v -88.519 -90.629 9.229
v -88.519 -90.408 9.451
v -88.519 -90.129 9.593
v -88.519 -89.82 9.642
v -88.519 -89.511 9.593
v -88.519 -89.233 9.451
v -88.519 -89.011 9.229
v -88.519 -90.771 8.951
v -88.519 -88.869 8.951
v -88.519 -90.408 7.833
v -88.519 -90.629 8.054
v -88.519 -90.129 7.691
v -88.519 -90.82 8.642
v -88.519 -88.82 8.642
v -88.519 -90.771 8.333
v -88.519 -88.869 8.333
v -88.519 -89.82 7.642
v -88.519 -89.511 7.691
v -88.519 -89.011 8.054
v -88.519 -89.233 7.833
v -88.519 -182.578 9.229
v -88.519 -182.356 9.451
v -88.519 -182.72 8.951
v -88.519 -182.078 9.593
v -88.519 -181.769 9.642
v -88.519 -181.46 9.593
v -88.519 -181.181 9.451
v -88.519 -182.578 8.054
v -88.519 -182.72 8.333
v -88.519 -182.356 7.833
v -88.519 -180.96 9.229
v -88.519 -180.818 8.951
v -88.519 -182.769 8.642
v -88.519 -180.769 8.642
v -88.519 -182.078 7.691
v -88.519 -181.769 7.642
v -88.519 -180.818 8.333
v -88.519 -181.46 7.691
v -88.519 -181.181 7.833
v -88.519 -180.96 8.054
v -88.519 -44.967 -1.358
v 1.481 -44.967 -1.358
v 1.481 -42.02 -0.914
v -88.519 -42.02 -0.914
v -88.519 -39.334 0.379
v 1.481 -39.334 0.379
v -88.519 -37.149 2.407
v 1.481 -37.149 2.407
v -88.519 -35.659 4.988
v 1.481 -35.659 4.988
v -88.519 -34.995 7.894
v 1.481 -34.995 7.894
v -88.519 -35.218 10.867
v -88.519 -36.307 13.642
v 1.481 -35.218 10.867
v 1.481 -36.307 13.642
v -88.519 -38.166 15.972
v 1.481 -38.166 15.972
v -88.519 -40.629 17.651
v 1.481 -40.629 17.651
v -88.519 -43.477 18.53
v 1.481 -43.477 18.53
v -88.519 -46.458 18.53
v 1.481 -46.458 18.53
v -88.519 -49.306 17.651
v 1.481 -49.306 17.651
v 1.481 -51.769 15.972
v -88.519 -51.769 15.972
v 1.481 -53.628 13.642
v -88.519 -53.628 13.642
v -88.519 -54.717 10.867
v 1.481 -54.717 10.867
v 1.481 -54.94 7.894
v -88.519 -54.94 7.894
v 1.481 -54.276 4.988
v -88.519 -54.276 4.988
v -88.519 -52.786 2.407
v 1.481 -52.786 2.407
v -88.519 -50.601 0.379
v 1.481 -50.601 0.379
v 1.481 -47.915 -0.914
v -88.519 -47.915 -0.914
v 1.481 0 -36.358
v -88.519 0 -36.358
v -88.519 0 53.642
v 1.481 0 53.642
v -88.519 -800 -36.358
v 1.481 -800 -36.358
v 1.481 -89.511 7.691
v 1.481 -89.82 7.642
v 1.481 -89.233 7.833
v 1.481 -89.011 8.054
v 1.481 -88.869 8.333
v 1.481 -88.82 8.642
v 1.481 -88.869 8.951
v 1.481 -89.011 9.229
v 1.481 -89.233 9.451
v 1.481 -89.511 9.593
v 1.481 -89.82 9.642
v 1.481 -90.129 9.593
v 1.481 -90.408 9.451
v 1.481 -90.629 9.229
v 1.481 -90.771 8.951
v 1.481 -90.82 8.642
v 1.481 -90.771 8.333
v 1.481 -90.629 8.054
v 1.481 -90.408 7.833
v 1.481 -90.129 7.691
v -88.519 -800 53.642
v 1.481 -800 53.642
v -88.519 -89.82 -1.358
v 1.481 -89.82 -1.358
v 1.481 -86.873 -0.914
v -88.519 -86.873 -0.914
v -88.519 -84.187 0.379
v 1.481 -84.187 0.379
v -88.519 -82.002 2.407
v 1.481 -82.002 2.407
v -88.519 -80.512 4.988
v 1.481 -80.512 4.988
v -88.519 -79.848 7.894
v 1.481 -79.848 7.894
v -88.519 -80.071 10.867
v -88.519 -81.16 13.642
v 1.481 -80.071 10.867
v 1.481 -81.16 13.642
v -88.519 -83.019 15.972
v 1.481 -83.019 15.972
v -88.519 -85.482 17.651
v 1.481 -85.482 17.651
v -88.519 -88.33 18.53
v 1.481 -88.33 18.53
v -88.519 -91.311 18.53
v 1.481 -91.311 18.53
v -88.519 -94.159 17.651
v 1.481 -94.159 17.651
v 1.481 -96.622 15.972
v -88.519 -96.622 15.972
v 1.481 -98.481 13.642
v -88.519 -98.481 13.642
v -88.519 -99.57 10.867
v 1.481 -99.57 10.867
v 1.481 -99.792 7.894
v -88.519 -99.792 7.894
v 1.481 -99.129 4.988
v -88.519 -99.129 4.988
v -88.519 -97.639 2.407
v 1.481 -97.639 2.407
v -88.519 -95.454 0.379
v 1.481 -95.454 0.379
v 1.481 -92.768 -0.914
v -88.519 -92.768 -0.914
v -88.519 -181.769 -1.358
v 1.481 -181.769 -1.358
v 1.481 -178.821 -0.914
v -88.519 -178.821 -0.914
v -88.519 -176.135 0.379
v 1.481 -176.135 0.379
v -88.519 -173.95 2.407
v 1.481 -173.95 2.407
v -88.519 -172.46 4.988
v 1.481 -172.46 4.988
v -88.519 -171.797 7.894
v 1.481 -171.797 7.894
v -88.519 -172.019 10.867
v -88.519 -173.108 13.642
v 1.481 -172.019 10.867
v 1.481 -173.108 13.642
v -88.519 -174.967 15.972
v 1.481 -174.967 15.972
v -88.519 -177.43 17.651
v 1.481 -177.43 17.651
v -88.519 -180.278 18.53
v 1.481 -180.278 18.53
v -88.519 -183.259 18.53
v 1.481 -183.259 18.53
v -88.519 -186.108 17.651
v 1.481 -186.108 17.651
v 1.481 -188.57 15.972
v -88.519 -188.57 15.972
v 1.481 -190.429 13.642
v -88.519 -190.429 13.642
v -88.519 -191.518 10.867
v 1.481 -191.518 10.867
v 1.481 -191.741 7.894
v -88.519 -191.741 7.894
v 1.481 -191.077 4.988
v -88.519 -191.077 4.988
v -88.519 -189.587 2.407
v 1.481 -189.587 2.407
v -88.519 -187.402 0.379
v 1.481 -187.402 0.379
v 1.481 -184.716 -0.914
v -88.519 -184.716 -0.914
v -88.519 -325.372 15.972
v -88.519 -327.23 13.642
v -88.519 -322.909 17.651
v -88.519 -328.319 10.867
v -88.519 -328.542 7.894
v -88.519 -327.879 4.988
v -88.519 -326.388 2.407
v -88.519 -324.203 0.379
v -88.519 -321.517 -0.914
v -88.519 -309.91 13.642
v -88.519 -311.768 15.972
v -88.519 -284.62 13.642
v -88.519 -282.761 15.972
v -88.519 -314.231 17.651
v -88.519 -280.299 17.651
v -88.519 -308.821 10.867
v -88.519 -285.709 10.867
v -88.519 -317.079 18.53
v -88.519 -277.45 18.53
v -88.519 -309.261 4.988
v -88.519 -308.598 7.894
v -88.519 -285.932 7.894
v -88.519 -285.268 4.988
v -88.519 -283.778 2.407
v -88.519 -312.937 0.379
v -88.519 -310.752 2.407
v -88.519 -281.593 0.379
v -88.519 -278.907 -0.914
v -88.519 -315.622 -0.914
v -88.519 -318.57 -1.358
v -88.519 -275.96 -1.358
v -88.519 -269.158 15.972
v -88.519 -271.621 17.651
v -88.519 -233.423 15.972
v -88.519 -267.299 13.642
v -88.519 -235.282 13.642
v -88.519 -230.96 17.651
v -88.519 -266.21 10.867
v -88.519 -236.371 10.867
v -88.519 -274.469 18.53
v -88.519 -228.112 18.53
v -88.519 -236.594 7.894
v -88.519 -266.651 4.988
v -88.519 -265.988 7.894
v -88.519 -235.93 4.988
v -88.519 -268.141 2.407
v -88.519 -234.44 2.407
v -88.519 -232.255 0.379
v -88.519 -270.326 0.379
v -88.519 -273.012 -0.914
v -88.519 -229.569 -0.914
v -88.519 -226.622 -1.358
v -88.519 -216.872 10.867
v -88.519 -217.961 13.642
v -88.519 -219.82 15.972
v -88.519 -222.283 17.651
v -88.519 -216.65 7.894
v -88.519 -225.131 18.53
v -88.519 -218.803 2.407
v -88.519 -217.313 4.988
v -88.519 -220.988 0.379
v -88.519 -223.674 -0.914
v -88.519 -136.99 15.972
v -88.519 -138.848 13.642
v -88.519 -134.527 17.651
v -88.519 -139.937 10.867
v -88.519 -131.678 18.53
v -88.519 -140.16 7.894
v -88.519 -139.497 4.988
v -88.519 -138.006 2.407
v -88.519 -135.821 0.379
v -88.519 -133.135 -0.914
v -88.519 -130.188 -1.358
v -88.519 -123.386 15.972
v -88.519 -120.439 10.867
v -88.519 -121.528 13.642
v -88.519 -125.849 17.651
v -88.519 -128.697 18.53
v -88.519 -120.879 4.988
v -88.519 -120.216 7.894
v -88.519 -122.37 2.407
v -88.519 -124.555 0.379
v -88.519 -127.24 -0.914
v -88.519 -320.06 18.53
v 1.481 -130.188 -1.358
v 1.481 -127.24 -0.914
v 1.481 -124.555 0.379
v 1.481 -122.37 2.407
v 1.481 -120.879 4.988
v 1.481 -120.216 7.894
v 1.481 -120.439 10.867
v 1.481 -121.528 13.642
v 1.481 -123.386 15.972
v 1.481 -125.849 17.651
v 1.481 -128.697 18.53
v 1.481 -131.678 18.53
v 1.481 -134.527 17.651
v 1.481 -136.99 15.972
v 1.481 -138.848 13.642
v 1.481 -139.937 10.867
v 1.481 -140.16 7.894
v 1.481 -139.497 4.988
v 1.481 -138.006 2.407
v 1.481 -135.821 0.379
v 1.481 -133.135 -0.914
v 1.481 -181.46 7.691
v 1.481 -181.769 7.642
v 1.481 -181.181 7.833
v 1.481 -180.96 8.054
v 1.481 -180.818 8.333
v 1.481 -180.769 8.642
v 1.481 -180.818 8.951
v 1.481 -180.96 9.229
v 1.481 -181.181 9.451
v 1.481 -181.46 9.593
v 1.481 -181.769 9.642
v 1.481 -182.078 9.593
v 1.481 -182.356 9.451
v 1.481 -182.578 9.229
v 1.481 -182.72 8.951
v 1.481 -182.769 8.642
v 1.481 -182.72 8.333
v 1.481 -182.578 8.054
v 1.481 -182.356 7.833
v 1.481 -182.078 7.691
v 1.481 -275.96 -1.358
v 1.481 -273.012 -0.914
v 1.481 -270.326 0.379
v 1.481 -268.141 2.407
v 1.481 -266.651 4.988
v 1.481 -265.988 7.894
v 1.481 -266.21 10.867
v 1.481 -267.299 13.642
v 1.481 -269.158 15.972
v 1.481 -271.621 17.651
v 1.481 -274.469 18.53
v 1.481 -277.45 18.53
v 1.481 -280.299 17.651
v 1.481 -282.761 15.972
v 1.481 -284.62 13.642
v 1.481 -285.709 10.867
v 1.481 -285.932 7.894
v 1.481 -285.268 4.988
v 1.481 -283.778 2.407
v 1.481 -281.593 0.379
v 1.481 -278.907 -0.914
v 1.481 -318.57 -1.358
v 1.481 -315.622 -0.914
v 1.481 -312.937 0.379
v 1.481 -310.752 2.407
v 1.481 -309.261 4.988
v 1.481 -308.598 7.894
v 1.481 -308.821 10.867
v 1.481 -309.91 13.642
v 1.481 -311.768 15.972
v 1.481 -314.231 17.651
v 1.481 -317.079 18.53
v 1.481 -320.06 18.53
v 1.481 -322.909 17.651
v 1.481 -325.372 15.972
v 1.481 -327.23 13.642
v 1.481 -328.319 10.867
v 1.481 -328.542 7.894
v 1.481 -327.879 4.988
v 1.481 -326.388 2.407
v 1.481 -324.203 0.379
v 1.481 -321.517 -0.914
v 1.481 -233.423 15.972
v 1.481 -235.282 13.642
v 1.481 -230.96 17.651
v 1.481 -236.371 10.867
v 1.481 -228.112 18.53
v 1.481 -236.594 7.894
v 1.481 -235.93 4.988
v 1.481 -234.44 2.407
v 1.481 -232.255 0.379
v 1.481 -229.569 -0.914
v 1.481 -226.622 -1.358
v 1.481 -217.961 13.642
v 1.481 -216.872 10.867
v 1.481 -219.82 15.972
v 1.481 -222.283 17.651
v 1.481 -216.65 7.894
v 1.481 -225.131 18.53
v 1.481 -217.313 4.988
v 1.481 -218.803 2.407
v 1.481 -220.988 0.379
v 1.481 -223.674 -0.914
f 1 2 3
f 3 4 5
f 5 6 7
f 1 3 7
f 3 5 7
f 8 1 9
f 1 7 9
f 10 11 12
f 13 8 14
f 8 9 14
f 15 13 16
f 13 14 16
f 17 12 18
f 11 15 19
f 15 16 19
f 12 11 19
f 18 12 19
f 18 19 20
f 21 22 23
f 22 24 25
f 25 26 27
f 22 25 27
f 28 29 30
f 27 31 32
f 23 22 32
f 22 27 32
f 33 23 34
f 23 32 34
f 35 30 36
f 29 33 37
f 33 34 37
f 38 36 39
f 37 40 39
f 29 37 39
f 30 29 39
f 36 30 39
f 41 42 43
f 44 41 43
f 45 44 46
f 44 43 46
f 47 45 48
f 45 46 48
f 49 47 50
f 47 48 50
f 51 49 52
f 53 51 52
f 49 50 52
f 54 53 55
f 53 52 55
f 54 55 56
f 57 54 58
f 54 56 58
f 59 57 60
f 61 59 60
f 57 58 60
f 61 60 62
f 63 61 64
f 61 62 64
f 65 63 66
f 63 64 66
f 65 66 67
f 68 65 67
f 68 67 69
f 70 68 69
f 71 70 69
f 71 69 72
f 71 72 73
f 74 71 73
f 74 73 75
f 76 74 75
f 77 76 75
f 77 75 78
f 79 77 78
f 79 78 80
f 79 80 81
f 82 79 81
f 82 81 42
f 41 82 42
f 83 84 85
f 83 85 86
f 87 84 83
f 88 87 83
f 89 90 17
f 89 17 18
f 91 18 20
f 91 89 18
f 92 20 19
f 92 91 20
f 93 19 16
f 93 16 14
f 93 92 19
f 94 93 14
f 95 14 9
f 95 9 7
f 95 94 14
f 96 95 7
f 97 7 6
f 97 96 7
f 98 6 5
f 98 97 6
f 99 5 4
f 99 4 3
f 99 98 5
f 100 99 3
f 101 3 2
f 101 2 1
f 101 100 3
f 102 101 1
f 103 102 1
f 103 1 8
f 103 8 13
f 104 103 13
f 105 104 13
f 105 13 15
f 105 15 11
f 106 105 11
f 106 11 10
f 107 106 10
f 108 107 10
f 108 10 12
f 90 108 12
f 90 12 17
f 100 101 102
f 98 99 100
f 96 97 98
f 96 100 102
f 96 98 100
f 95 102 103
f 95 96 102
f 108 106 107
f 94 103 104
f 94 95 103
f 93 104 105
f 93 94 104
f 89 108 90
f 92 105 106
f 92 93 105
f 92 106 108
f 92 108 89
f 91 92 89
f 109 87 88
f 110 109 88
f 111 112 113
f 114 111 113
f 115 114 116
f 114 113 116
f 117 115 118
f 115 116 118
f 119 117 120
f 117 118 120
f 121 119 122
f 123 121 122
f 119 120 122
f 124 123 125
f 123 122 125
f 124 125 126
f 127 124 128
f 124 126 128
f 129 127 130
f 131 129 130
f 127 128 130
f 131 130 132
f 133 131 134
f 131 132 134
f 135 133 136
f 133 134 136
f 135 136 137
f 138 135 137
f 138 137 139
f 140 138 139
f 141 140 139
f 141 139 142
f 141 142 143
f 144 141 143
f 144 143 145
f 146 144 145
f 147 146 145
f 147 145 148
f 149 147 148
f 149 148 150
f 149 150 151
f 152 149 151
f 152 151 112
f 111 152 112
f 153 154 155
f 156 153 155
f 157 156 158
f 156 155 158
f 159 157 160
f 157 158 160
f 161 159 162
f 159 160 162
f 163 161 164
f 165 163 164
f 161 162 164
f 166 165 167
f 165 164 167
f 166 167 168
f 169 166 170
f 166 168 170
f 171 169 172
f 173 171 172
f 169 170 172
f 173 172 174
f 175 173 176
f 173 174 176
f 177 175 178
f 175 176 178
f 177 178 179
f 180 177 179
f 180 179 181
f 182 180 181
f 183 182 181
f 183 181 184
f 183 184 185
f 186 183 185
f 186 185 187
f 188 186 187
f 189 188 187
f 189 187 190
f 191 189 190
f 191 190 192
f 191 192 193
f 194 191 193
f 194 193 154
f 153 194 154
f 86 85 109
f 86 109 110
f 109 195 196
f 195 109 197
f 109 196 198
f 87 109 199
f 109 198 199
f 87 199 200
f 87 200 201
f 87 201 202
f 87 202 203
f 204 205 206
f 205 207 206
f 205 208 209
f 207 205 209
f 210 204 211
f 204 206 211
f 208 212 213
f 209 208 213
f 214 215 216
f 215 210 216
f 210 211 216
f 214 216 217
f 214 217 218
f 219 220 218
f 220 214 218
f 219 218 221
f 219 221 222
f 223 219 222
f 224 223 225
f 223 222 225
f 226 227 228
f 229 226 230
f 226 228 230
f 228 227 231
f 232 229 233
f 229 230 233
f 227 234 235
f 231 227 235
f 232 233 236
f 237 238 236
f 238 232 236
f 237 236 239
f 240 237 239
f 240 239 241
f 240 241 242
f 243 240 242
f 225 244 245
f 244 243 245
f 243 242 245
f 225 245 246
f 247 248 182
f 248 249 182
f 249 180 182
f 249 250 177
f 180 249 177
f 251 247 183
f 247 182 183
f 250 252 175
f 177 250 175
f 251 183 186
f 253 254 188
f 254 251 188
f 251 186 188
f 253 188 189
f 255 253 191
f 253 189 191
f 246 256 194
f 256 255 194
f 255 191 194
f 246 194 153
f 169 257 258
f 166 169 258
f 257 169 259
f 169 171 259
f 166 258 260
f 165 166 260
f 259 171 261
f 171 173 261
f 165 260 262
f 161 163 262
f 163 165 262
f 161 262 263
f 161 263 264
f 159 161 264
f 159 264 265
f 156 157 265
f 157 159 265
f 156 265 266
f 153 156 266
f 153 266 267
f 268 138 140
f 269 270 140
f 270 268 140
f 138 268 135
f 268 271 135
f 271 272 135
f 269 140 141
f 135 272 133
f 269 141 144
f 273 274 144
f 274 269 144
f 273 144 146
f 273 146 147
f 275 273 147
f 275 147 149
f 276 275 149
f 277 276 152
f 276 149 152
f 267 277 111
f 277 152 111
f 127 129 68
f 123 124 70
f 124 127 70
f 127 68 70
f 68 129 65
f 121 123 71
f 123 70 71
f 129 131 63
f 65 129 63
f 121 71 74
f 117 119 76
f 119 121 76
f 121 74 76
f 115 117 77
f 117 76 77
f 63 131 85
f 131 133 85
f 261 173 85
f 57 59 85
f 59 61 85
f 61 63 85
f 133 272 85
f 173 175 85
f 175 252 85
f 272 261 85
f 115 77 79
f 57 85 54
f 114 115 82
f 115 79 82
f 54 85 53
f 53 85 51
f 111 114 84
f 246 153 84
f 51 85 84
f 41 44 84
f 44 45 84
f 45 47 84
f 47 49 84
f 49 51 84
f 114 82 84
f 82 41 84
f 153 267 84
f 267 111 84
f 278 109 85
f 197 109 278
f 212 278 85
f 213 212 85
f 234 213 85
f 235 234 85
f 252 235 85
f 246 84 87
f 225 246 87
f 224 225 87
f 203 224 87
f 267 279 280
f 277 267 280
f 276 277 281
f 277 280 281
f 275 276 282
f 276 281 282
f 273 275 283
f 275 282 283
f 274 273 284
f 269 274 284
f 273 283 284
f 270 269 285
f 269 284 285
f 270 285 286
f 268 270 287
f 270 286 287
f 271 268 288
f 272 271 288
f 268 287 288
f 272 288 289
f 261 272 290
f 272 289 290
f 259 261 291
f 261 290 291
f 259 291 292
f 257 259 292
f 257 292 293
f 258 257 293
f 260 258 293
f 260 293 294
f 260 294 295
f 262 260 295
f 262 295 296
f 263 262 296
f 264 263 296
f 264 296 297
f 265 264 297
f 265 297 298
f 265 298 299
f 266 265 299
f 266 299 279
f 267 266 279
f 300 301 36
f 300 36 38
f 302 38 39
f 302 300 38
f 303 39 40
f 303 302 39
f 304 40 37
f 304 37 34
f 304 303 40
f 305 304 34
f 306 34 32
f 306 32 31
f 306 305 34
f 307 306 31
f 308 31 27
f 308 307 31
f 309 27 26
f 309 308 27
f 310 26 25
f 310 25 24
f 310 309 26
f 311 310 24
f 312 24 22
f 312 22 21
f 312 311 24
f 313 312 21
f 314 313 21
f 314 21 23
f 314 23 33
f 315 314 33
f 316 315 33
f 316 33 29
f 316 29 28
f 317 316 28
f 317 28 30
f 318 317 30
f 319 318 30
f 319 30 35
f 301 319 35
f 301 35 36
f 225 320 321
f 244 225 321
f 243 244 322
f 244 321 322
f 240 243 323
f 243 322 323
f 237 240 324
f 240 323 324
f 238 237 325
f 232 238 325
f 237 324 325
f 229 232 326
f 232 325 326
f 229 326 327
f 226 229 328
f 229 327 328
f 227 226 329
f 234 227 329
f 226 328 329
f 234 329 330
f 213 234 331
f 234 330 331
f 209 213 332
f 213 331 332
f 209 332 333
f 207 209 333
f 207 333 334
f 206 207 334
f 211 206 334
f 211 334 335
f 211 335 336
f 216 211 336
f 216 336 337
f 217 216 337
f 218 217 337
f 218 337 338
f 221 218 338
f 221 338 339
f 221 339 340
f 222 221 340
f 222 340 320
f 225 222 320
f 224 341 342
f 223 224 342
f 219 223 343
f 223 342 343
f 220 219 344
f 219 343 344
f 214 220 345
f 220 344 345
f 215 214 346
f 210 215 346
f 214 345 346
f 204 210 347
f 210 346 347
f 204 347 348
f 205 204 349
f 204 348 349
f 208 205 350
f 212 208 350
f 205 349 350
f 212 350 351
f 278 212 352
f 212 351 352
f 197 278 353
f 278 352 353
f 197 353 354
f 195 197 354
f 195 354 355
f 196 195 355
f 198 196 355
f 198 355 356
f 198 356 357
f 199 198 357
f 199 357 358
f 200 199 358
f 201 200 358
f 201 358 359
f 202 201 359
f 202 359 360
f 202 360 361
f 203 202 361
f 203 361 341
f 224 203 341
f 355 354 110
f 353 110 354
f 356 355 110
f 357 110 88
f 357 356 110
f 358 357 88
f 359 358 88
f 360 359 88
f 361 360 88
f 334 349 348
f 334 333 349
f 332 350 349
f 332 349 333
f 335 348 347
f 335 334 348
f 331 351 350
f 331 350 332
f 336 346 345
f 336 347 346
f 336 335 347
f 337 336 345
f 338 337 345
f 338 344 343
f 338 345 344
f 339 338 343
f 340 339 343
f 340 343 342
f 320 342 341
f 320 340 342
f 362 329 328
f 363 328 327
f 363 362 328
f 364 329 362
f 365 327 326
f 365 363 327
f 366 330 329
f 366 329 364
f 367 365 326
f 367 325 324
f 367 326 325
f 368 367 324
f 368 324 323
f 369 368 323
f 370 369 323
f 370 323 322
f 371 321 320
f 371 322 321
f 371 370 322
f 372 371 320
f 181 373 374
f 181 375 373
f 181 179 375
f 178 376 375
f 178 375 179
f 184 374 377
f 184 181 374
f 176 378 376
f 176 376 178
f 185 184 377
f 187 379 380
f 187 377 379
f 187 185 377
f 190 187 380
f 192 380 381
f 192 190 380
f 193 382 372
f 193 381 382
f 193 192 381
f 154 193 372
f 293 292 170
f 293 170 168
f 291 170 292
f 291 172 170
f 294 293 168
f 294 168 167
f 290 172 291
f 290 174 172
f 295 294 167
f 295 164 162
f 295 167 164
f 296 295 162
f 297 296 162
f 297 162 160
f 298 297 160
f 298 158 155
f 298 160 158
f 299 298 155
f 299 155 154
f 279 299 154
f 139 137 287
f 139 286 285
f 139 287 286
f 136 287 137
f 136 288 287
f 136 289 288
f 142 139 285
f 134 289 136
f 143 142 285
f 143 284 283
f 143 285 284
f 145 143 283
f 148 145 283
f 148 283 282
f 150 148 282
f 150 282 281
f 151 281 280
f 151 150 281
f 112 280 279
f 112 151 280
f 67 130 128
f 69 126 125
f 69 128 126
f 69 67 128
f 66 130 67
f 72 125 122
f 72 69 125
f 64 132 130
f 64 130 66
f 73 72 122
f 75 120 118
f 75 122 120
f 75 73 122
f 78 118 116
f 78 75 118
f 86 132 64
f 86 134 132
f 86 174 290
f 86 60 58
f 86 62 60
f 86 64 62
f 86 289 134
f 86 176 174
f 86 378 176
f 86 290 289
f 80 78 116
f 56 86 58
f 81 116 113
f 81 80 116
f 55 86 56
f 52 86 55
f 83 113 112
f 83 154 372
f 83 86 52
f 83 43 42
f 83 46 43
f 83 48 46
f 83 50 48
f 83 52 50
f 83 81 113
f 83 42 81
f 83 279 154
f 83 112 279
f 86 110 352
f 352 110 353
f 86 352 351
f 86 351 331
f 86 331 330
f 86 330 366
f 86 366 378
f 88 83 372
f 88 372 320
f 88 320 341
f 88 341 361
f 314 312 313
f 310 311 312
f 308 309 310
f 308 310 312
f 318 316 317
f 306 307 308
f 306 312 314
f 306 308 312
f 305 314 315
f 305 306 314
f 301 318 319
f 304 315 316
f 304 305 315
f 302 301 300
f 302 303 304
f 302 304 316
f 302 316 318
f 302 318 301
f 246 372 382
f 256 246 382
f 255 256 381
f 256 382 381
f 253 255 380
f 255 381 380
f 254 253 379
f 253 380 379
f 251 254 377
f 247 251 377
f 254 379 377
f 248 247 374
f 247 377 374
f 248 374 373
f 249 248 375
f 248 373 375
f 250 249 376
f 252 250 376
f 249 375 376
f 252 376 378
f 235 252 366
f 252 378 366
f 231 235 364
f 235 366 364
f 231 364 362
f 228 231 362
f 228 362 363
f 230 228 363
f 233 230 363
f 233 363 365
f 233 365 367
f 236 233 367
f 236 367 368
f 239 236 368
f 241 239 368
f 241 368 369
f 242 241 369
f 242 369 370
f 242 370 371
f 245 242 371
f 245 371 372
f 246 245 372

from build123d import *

# Parameters (mm, degrees)
SKETCH1_W           = 90
SKETCH1_H           = 90
BOSS_EXTRUDE1_DEPTH = 800
SKETCH2_R           = 10
SKETCH2_R_2         = 1
CUT_EXTRUDE1_DEPTH  = 91


with BuildPart() as part:
    # Sketch1 → Boss-Extrude1 (new body)
    with BuildSketch(Plane(origin=(0, 0, 0), x_dir=(1, 0, 0), z_dir=(0, 1, 0))):
        with Locations((-43.518937289, -8.641660154)):
            Rectangle(SKETCH1_W, SKETCH1_H)
    extrude(amount=-BOSS_EXTRUDE1_DEPTH)

    # Sketch2 → Cut-Extrude1 (cut, through all)
    with BuildSketch(Plane(origin=(1.481062711, 0, 0), x_dir=(0, 0, -1), z_dir=(1, 0, 0))):
        with Locations((-8.641660154, -44.967494137)):
            Circle(SKETCH2_R)
        with Locations((-8.641660154, -130.187913203)):
            Circle(SKETCH2_R)
        with Locations((-8.641660154, -226.621545304)):
            Circle(SKETCH2_R)
        with Locations((-8.641660154, -275.959682658)):
            Circle(SKETCH2_R)
        with Locations((-8.641660154, -318.569892192)):
            Circle(SKETCH2_R)
        with Locations((-8.641660154, -181.768693164)):
            Circle(SKETCH2_R)
        with Locations((-8.641660154, -181.768693164)):
            Circle(SKETCH2_R_2, mode=Mode.SUBTRACT)
        with Locations((-8.641660154, -89.820346277)):
            Circle(SKETCH2_R)
        with Locations((-8.641660154, -89.820346277)):
            Circle(SKETCH2_R_2, mode=Mode.SUBTRACT)
    extrude(amount=-CUT_EXTRUDE1_DEPTH, mode=Mode.SUBTRACT)


solid = part.part
